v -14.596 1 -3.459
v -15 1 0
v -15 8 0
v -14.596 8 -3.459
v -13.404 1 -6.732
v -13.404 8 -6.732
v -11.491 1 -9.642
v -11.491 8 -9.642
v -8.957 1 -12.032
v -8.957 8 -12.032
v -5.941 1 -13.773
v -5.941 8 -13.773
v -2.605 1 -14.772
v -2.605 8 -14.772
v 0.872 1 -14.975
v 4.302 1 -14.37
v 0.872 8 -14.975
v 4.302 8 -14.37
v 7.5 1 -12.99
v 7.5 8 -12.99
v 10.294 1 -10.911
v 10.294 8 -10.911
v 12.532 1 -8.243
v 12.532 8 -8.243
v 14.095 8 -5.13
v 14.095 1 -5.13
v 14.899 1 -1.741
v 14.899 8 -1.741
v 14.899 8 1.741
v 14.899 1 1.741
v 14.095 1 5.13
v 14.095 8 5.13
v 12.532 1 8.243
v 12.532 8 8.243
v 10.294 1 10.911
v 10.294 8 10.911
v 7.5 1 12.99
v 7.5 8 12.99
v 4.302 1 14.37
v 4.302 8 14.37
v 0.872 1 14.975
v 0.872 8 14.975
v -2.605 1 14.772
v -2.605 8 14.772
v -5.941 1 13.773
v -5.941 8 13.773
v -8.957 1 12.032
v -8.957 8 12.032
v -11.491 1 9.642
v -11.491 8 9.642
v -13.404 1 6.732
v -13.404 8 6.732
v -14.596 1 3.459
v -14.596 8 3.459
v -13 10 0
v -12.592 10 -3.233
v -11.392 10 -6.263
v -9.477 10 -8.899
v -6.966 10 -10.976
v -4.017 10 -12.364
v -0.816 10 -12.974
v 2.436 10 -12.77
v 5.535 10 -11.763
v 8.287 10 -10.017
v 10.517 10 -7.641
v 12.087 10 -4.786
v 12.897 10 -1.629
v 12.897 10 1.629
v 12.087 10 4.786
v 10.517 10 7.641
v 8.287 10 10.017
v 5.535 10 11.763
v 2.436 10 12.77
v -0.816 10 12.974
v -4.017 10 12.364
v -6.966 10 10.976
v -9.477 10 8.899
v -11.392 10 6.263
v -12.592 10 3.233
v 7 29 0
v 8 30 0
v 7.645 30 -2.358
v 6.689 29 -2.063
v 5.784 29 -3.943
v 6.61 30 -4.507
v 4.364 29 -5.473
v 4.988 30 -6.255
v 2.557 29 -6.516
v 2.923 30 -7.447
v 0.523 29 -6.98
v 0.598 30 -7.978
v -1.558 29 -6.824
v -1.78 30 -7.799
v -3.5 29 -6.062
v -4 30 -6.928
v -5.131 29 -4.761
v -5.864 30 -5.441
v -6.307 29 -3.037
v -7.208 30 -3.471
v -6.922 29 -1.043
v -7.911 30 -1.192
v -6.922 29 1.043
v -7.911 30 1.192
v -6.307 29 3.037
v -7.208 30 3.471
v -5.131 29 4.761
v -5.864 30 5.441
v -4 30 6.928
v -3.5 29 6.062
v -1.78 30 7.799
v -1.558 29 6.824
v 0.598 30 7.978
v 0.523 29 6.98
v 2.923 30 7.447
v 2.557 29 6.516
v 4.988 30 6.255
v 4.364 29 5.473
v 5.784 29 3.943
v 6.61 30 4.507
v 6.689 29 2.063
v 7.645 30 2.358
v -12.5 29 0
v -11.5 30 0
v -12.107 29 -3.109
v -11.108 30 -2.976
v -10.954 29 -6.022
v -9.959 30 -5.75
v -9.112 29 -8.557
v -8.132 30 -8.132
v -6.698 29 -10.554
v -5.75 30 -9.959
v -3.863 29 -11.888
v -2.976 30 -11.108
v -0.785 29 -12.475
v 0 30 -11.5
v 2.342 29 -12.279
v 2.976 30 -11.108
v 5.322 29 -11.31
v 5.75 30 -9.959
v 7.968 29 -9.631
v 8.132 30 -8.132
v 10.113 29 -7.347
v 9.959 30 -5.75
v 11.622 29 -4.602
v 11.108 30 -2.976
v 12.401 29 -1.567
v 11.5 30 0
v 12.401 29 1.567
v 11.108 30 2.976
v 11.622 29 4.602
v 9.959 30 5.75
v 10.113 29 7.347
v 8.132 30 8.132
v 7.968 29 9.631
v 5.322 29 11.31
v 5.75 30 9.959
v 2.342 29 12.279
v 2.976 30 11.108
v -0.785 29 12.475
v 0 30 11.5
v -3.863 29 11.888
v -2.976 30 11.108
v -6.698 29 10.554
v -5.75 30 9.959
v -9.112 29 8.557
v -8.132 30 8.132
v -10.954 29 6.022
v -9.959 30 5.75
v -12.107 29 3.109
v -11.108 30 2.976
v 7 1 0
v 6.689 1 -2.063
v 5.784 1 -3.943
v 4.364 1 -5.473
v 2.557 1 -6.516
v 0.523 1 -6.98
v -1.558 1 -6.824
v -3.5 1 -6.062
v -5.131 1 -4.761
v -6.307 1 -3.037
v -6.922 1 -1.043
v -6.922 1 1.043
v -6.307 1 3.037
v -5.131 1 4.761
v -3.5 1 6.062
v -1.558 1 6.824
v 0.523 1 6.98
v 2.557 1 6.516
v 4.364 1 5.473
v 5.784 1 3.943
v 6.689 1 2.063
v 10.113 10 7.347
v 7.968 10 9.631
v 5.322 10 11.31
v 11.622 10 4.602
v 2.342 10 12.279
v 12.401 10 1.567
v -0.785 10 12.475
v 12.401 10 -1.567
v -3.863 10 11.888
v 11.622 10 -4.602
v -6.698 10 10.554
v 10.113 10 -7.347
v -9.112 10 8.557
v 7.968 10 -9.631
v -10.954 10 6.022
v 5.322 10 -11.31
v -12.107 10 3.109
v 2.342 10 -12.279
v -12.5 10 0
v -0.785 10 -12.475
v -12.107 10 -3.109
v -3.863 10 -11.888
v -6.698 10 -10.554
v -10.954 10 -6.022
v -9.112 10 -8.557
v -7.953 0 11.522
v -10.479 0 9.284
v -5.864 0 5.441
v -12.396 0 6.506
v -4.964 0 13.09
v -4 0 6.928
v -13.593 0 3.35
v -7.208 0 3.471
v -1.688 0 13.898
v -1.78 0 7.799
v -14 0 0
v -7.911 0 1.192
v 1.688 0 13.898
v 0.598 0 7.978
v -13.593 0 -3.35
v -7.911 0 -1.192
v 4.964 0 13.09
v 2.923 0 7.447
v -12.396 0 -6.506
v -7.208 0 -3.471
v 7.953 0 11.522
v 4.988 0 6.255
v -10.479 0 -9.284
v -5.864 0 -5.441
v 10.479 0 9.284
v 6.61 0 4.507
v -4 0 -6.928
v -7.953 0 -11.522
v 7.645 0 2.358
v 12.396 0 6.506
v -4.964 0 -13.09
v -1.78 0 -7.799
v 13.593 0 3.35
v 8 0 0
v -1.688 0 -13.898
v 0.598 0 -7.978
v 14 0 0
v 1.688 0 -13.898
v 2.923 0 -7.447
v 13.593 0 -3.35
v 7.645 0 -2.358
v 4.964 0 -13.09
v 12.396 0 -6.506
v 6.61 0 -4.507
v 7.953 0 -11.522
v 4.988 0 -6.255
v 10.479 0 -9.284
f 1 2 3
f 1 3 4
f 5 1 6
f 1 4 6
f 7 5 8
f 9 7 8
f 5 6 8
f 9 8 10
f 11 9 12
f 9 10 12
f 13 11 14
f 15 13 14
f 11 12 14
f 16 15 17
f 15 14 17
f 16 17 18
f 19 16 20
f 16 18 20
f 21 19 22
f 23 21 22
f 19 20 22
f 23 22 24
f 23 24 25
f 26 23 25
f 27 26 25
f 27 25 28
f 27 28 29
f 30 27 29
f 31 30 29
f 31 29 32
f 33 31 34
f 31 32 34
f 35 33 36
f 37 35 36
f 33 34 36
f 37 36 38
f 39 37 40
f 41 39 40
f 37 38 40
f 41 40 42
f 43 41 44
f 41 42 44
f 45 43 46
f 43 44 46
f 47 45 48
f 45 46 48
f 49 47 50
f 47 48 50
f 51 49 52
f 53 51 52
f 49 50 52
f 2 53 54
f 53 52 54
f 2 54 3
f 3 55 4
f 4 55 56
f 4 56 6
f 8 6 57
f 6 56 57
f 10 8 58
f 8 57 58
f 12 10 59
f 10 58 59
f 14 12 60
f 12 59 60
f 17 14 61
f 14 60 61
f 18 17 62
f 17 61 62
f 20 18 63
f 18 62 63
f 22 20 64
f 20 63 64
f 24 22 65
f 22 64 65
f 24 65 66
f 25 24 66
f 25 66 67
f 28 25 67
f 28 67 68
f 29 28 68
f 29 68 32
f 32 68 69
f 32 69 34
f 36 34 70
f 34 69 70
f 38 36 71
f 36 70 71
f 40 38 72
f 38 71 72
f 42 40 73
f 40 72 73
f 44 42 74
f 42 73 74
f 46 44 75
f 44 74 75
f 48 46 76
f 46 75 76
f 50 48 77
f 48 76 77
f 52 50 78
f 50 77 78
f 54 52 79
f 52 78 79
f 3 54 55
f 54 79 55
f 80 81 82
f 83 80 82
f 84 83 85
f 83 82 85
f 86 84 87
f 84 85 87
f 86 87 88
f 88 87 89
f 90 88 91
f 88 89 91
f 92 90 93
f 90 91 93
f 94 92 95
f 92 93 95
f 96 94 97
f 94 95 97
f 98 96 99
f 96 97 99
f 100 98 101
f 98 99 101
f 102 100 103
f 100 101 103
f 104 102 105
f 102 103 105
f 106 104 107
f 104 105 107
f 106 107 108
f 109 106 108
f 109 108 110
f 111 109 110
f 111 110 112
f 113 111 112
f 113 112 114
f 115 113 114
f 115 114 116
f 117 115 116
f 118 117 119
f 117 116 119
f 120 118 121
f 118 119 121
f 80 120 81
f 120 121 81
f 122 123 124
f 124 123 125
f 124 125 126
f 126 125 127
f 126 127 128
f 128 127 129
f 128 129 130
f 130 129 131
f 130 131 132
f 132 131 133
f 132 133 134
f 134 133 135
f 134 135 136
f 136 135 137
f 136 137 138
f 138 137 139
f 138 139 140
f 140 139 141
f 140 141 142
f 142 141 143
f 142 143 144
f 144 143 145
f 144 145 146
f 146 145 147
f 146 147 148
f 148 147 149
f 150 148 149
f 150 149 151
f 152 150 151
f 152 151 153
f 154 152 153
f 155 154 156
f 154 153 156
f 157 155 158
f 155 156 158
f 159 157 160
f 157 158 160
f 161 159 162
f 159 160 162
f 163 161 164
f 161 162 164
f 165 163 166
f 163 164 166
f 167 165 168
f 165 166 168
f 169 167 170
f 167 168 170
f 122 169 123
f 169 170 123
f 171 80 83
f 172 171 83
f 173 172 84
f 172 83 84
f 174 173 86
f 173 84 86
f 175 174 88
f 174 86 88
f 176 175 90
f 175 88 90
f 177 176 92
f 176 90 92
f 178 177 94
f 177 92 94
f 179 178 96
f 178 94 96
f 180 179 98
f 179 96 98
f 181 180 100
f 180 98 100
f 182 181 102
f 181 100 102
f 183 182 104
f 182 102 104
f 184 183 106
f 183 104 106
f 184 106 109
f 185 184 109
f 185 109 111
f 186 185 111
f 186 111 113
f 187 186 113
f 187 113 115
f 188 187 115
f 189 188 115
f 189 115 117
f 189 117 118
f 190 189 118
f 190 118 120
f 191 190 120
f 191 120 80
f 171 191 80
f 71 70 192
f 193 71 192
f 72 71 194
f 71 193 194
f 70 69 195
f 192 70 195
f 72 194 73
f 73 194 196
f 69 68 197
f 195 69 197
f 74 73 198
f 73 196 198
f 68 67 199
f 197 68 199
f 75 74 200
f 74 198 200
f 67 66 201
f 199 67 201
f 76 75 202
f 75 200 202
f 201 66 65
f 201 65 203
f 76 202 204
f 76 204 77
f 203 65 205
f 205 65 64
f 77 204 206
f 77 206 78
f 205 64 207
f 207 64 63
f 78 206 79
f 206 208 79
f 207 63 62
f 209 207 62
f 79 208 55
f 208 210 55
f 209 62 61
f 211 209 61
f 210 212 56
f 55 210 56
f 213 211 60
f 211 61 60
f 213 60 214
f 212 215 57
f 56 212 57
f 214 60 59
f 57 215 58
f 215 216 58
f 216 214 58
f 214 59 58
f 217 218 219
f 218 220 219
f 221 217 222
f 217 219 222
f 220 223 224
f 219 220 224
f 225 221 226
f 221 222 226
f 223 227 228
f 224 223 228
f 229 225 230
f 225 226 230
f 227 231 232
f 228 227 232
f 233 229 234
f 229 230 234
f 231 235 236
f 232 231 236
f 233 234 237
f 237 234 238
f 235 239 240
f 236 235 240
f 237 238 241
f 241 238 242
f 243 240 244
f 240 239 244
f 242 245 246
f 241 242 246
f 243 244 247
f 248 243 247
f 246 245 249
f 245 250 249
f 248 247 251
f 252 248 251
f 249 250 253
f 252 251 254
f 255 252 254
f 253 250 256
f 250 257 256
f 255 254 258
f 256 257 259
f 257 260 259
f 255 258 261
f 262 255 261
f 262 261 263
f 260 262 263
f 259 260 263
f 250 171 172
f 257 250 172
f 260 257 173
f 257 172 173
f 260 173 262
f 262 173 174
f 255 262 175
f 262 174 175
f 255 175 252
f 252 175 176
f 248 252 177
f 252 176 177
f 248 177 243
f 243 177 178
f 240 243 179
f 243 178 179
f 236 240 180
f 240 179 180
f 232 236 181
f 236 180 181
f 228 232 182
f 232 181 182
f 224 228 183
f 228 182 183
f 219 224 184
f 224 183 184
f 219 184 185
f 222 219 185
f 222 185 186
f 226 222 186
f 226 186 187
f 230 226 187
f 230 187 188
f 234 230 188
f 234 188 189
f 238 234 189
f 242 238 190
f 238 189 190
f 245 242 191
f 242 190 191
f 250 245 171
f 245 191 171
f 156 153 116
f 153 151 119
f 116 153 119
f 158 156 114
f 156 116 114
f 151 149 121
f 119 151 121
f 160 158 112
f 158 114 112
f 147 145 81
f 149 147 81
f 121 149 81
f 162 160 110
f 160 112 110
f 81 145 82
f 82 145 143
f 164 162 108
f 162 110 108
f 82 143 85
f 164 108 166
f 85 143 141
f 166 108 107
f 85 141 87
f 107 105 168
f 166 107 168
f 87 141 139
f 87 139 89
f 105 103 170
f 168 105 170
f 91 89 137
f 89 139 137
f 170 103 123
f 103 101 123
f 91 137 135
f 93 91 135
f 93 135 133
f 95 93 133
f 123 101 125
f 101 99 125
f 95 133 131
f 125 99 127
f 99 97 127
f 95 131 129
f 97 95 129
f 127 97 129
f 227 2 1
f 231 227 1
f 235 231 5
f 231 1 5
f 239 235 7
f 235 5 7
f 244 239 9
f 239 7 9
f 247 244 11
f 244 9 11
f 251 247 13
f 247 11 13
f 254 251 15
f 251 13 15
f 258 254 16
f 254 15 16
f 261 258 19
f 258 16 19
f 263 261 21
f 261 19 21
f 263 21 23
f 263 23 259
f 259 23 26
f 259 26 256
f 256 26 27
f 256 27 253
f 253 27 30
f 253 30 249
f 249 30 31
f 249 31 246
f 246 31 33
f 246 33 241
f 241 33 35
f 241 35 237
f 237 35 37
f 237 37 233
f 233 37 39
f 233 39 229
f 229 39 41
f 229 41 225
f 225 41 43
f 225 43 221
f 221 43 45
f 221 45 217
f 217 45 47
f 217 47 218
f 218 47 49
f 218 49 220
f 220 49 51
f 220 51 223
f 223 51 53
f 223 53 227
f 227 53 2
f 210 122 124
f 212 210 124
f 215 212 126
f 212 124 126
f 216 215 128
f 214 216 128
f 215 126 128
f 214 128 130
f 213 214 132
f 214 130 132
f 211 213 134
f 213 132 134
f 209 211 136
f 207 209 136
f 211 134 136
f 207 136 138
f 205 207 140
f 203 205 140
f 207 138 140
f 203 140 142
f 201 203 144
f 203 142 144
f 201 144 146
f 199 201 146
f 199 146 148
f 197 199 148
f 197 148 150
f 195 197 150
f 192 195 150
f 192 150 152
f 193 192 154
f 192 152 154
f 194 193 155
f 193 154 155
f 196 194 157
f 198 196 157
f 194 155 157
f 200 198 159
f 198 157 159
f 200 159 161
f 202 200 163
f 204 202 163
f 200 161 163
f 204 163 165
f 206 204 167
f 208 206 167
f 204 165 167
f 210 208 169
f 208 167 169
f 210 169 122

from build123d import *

# Parameters (mm, degrees)
CHAMFER_1_SIZE         = 1
CHAMFER_2_SIZE         = 2
HOLE_WIZARD_M161_D     = 14
HOLE_WIZARD_M161_DEPTH = 50
HOLE_WIZARD_M161_TIP   = 4.041451884
CHAMFER_3_SIZE         = 1


with BuildPart() as part:
    # Эскиз1 → Повернуть1 (revolve)
    with BuildSketch(Plane.XY):
        Polygon((0, 0), (-15, 0), (-15, 10), (-12.5, 10), (-12.5, 30), (0, 30), align=None)
    revolve(axis=Axis((0, 30, 0), (0, -1, 0)))

    # Фаска1
    chamfer_1_edges = [part.edges().sort_by_distance(p)[0] for p in [
        (12.5, 30, 0),
        (15, 0, 0),
    ]]
    chamfer(chamfer_1_edges, length=CHAMFER_1_SIZE)

    # Фаска2
    chamfer_2_edges = [part.edges().sort_by_distance(p)[0] for p in [
        (15, 10, 0),
    ]]
    chamfer(chamfer_2_edges, length=CHAMFER_2_SIZE)

    # Отверстие обработанное метчиком M161
    with Locations(Plane(origin=(0, 0, 0), x_dir=(-1, 0, 0), z_dir=(0, -1, 0))):
        with Locations((0, 0)):
            Hole(HOLE_WIZARD_M161_D / 2, depth=HOLE_WIZARD_M161_DEPTH)
            with Locations((0, 0, -(HOLE_WIZARD_M161_DEPTH + HOLE_WIZARD_M161_TIP / 2))):  # 120° drill point
                Cone(0, HOLE_WIZARD_M161_D / 2, HOLE_WIZARD_M161_TIP, mode=Mode.SUBTRACT)

    # Фаска3
    chamfer_3_edges = [part.edges().sort_by_distance(p)[0] for p in [
        (-7, 30, 0),
        (-7, 0, 0),
    ]]
    chamfer(chamfer_3_edges, length=CHAMFER_3_SIZE)


solid = part.part
